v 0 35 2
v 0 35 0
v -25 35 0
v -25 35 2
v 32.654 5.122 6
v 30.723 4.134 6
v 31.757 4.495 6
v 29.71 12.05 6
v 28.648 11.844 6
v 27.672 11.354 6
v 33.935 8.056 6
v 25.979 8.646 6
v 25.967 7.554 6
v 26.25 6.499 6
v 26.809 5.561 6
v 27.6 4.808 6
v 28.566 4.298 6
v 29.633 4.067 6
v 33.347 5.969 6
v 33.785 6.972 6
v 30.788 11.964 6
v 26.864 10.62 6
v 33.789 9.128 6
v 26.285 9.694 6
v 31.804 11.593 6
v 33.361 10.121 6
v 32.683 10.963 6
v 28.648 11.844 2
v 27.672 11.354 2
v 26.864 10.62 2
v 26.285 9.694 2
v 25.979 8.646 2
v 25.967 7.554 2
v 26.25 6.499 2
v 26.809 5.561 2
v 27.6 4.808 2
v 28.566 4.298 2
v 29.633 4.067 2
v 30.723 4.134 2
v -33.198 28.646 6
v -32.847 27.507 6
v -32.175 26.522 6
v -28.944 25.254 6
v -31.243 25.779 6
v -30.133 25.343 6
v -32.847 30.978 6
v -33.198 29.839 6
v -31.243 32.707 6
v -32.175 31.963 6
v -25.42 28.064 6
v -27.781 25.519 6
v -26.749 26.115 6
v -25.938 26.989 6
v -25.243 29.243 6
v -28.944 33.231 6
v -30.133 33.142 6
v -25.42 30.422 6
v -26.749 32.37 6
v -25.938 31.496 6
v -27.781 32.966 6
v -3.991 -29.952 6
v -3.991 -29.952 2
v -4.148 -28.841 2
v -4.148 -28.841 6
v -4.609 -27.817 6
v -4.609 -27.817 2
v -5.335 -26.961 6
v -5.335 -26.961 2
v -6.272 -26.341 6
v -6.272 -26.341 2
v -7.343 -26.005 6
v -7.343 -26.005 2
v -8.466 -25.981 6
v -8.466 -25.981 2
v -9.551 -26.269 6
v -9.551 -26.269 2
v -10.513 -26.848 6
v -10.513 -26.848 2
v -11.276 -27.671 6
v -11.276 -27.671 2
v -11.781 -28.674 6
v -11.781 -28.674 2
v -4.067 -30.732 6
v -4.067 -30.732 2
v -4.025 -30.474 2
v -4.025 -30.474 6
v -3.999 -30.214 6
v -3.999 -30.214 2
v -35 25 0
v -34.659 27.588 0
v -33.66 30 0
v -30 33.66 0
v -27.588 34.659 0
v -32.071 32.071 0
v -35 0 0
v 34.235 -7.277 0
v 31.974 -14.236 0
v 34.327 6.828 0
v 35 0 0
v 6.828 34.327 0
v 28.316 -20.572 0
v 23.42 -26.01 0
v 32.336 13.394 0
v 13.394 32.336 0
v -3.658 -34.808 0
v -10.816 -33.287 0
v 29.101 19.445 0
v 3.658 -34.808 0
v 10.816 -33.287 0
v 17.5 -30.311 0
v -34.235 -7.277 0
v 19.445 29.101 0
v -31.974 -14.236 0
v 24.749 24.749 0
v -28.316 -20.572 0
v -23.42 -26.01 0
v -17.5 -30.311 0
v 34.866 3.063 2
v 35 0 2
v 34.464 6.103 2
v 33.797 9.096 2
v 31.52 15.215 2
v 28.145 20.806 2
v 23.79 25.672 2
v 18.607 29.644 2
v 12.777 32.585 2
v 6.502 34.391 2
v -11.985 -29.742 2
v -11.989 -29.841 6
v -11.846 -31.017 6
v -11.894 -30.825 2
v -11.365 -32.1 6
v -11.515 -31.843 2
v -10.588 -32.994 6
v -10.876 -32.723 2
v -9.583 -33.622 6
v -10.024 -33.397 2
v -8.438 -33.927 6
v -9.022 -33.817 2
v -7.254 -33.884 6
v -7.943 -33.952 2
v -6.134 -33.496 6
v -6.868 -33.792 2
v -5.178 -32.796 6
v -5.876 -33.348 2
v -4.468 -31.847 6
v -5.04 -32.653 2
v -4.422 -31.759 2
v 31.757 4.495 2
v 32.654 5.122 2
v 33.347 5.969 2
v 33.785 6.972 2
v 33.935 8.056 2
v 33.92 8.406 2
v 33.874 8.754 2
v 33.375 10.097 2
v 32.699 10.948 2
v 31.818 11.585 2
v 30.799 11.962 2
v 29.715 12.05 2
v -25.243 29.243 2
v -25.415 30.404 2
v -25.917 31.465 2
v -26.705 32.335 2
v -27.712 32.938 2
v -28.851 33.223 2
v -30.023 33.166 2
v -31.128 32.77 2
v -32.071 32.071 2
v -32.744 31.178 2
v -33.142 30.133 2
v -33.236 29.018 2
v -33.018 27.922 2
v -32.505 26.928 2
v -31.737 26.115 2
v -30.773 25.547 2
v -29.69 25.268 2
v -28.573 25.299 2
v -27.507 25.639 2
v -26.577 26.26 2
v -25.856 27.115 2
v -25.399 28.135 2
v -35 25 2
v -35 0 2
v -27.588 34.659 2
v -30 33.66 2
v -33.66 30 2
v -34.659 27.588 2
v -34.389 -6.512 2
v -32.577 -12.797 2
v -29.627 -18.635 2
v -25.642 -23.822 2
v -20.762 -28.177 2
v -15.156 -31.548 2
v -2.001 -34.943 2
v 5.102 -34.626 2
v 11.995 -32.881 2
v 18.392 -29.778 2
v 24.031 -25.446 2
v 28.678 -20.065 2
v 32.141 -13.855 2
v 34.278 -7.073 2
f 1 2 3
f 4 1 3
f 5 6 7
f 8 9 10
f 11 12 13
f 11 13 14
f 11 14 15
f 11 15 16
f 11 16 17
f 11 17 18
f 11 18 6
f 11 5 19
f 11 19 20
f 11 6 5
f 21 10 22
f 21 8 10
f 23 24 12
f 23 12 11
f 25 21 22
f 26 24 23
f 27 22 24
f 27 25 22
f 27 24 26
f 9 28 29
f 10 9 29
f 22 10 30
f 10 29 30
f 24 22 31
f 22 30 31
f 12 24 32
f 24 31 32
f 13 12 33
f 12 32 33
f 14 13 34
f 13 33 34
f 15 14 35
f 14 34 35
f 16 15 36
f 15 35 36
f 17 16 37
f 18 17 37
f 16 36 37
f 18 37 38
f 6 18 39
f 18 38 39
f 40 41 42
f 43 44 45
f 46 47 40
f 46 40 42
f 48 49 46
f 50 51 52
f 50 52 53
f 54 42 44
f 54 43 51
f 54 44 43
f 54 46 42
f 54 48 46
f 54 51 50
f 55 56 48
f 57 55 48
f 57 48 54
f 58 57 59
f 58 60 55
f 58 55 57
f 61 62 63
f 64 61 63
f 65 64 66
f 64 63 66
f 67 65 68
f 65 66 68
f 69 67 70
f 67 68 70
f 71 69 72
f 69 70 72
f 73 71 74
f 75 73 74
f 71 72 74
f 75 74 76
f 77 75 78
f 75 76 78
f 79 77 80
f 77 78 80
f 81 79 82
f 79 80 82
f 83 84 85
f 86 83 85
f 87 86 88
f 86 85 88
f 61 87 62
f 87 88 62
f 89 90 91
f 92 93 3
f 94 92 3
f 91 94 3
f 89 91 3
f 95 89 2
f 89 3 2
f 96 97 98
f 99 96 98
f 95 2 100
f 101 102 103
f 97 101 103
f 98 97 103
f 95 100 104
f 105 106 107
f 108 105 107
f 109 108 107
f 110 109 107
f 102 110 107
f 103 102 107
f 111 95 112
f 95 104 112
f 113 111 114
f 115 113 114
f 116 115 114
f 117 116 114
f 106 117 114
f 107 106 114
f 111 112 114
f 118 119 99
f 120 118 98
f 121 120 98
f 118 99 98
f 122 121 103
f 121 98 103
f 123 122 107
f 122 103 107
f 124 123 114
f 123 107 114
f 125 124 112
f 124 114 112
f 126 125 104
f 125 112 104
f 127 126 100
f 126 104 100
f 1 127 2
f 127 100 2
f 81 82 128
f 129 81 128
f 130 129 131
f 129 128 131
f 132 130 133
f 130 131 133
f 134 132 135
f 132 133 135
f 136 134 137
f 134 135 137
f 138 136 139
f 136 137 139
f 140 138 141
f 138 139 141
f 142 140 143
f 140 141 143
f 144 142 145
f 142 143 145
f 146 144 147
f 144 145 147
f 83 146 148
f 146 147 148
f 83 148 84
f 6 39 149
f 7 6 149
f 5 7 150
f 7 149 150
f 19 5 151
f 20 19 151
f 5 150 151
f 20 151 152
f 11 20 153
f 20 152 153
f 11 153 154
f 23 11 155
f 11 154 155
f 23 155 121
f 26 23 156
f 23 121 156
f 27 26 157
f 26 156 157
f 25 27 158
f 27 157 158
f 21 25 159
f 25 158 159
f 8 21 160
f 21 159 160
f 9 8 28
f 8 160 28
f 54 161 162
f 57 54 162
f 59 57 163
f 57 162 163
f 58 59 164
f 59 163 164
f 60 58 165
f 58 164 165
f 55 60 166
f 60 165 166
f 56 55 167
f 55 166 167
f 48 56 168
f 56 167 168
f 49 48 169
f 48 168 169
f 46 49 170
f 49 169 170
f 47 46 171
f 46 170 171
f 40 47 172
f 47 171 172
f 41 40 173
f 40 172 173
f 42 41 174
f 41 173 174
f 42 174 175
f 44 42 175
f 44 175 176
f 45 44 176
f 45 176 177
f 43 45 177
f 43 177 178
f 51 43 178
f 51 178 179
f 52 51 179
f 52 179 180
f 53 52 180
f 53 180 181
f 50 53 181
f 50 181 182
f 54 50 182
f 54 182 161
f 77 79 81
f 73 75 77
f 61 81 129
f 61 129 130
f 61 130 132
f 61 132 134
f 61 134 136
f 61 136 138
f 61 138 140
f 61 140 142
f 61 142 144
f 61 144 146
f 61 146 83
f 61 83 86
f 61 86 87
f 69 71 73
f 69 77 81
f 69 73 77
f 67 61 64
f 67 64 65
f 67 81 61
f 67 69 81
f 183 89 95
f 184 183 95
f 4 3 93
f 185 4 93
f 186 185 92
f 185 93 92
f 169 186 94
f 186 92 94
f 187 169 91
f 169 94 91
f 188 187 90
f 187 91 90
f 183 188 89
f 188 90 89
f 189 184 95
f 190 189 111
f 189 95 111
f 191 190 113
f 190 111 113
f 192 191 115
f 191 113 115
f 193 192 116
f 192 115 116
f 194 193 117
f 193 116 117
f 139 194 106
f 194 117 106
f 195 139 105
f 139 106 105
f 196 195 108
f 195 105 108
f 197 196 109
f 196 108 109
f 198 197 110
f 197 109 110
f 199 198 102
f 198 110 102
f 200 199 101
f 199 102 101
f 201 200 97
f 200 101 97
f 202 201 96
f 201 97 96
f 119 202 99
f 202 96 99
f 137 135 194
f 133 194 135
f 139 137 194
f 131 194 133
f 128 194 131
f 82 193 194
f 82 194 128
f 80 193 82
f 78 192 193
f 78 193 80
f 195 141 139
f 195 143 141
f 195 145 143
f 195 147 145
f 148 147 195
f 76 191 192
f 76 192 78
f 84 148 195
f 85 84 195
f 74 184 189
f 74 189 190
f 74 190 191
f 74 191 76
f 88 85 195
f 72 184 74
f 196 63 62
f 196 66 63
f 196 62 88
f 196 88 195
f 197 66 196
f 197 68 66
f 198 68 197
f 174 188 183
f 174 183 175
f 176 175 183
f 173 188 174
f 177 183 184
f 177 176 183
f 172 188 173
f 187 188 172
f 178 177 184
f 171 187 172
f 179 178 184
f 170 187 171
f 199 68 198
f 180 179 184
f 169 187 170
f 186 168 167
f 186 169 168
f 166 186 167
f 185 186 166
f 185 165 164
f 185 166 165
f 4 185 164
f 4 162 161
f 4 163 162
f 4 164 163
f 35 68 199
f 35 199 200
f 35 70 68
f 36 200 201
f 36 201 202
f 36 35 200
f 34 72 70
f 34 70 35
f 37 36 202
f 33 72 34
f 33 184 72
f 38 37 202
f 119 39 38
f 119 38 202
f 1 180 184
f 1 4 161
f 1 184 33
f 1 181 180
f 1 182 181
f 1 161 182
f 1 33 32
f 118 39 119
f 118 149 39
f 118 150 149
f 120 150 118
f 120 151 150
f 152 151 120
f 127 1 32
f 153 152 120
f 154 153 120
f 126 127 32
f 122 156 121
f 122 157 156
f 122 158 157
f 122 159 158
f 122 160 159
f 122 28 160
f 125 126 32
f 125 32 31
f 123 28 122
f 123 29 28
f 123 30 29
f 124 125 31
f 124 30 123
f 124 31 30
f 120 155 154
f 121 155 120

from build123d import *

# Parameters (mm, degrees)
F1_DEPTH = 2
F2_R     = 4
F3_DEPTH = 4


with BuildPart() as f1:
    # F0 (on Top) → F1 (new body)
    with BuildSketch(Plane.XY):
        with BuildLine():
            ThreePointArc((-35, 0), (0, -35), (35, 0))
            ThreePointArc((35, 0), (24.7487373415, 24.7487373415), (0, 35))
            Line((0, 35), (0, 0))
            Line((0, 0), (-35, 0))
        make_face()
        with BuildLine():
            Line((0, 0), (0, 35))
            ThreePointArc((0, 35), (-24.7487373415, 24.7487373415), (-35, 0))
            Line((-35, 0), (0, 0))
        make_face()
        with BuildLine():
            ThreePointArc((-35, 0), (-24.7487373415, 24.7487373415), (0, 35))
            Line((0, 35), (-25, 35))
            ThreePointArc((-25, 35), (-32.0710678119, 32.0710678119), (-35, 25))
            Line((-35, 25), (-35, 0))
        make_face()
    extrude(amount=F1_DEPTH)

    # F2 (on face) → F3 (join)
    with BuildSketch(Plane.XY.offset(2)):
        with BuildLine():
            ThreePointArc((-3.9906925033, -29.9524428606), (-7.343019412, -26.0052261745), (-11.7809522867, -28.6741898442))
            ThreePointArc((-11.7809522867, -28.6741898442), (-7.9906925033, -29.9524428606), (-4.0673930944, -30.7320079626))
            ThreePointArc((-4.0673930944, -30.7320079626), (-4.0099138335, -30.3441074904), (-3.9906925033, -29.9524428606))
        make_face()
        with BuildLine():
            ThreePointArc((28.6483961521, 11.8435382344), (26.0723520067, 7.0165846991), (30.7230529813, 4.134490961))
            ThreePointArc((30.7230529813, 4.134490961), (29.9349226743, 8.0560787286), (28.6483961521, 11.8435382344))
        make_face()
        with BuildLine():
            ThreePointArc((28.6483961521, 11.8435382344), (29.9349226743, 8.0560787286), (30.7230529813, 4.134490961))
            ThreePointArc((30.7230529813, 4.134490961), (33.0294760531, 5.5215690352), (33.9349226743, 8.0560787286))
            ThreePointArc((33.9349226743, 8.0560787286), (32.2645035284, 11.3077018686), (28.6483961521, 11.8435382344))
        make_face()
        with BuildLine():
            ThreePointArc((-4.0673930944, -30.7320079626), (-7.9906925033, -29.9524428606), (-11.7809522867, -28.6741898442))
            ThreePointArc((-11.7809522867, -28.6741898442), (-9.0217496005, -33.8172741975), (-4.0673930944, -30.7320079626))
        make_face()
        with Locations((-29.2426406871, 29.2426406871)):
            Circle(F2_R)
    extrude(amount=F3_DEPTH)


solid = f1.part
